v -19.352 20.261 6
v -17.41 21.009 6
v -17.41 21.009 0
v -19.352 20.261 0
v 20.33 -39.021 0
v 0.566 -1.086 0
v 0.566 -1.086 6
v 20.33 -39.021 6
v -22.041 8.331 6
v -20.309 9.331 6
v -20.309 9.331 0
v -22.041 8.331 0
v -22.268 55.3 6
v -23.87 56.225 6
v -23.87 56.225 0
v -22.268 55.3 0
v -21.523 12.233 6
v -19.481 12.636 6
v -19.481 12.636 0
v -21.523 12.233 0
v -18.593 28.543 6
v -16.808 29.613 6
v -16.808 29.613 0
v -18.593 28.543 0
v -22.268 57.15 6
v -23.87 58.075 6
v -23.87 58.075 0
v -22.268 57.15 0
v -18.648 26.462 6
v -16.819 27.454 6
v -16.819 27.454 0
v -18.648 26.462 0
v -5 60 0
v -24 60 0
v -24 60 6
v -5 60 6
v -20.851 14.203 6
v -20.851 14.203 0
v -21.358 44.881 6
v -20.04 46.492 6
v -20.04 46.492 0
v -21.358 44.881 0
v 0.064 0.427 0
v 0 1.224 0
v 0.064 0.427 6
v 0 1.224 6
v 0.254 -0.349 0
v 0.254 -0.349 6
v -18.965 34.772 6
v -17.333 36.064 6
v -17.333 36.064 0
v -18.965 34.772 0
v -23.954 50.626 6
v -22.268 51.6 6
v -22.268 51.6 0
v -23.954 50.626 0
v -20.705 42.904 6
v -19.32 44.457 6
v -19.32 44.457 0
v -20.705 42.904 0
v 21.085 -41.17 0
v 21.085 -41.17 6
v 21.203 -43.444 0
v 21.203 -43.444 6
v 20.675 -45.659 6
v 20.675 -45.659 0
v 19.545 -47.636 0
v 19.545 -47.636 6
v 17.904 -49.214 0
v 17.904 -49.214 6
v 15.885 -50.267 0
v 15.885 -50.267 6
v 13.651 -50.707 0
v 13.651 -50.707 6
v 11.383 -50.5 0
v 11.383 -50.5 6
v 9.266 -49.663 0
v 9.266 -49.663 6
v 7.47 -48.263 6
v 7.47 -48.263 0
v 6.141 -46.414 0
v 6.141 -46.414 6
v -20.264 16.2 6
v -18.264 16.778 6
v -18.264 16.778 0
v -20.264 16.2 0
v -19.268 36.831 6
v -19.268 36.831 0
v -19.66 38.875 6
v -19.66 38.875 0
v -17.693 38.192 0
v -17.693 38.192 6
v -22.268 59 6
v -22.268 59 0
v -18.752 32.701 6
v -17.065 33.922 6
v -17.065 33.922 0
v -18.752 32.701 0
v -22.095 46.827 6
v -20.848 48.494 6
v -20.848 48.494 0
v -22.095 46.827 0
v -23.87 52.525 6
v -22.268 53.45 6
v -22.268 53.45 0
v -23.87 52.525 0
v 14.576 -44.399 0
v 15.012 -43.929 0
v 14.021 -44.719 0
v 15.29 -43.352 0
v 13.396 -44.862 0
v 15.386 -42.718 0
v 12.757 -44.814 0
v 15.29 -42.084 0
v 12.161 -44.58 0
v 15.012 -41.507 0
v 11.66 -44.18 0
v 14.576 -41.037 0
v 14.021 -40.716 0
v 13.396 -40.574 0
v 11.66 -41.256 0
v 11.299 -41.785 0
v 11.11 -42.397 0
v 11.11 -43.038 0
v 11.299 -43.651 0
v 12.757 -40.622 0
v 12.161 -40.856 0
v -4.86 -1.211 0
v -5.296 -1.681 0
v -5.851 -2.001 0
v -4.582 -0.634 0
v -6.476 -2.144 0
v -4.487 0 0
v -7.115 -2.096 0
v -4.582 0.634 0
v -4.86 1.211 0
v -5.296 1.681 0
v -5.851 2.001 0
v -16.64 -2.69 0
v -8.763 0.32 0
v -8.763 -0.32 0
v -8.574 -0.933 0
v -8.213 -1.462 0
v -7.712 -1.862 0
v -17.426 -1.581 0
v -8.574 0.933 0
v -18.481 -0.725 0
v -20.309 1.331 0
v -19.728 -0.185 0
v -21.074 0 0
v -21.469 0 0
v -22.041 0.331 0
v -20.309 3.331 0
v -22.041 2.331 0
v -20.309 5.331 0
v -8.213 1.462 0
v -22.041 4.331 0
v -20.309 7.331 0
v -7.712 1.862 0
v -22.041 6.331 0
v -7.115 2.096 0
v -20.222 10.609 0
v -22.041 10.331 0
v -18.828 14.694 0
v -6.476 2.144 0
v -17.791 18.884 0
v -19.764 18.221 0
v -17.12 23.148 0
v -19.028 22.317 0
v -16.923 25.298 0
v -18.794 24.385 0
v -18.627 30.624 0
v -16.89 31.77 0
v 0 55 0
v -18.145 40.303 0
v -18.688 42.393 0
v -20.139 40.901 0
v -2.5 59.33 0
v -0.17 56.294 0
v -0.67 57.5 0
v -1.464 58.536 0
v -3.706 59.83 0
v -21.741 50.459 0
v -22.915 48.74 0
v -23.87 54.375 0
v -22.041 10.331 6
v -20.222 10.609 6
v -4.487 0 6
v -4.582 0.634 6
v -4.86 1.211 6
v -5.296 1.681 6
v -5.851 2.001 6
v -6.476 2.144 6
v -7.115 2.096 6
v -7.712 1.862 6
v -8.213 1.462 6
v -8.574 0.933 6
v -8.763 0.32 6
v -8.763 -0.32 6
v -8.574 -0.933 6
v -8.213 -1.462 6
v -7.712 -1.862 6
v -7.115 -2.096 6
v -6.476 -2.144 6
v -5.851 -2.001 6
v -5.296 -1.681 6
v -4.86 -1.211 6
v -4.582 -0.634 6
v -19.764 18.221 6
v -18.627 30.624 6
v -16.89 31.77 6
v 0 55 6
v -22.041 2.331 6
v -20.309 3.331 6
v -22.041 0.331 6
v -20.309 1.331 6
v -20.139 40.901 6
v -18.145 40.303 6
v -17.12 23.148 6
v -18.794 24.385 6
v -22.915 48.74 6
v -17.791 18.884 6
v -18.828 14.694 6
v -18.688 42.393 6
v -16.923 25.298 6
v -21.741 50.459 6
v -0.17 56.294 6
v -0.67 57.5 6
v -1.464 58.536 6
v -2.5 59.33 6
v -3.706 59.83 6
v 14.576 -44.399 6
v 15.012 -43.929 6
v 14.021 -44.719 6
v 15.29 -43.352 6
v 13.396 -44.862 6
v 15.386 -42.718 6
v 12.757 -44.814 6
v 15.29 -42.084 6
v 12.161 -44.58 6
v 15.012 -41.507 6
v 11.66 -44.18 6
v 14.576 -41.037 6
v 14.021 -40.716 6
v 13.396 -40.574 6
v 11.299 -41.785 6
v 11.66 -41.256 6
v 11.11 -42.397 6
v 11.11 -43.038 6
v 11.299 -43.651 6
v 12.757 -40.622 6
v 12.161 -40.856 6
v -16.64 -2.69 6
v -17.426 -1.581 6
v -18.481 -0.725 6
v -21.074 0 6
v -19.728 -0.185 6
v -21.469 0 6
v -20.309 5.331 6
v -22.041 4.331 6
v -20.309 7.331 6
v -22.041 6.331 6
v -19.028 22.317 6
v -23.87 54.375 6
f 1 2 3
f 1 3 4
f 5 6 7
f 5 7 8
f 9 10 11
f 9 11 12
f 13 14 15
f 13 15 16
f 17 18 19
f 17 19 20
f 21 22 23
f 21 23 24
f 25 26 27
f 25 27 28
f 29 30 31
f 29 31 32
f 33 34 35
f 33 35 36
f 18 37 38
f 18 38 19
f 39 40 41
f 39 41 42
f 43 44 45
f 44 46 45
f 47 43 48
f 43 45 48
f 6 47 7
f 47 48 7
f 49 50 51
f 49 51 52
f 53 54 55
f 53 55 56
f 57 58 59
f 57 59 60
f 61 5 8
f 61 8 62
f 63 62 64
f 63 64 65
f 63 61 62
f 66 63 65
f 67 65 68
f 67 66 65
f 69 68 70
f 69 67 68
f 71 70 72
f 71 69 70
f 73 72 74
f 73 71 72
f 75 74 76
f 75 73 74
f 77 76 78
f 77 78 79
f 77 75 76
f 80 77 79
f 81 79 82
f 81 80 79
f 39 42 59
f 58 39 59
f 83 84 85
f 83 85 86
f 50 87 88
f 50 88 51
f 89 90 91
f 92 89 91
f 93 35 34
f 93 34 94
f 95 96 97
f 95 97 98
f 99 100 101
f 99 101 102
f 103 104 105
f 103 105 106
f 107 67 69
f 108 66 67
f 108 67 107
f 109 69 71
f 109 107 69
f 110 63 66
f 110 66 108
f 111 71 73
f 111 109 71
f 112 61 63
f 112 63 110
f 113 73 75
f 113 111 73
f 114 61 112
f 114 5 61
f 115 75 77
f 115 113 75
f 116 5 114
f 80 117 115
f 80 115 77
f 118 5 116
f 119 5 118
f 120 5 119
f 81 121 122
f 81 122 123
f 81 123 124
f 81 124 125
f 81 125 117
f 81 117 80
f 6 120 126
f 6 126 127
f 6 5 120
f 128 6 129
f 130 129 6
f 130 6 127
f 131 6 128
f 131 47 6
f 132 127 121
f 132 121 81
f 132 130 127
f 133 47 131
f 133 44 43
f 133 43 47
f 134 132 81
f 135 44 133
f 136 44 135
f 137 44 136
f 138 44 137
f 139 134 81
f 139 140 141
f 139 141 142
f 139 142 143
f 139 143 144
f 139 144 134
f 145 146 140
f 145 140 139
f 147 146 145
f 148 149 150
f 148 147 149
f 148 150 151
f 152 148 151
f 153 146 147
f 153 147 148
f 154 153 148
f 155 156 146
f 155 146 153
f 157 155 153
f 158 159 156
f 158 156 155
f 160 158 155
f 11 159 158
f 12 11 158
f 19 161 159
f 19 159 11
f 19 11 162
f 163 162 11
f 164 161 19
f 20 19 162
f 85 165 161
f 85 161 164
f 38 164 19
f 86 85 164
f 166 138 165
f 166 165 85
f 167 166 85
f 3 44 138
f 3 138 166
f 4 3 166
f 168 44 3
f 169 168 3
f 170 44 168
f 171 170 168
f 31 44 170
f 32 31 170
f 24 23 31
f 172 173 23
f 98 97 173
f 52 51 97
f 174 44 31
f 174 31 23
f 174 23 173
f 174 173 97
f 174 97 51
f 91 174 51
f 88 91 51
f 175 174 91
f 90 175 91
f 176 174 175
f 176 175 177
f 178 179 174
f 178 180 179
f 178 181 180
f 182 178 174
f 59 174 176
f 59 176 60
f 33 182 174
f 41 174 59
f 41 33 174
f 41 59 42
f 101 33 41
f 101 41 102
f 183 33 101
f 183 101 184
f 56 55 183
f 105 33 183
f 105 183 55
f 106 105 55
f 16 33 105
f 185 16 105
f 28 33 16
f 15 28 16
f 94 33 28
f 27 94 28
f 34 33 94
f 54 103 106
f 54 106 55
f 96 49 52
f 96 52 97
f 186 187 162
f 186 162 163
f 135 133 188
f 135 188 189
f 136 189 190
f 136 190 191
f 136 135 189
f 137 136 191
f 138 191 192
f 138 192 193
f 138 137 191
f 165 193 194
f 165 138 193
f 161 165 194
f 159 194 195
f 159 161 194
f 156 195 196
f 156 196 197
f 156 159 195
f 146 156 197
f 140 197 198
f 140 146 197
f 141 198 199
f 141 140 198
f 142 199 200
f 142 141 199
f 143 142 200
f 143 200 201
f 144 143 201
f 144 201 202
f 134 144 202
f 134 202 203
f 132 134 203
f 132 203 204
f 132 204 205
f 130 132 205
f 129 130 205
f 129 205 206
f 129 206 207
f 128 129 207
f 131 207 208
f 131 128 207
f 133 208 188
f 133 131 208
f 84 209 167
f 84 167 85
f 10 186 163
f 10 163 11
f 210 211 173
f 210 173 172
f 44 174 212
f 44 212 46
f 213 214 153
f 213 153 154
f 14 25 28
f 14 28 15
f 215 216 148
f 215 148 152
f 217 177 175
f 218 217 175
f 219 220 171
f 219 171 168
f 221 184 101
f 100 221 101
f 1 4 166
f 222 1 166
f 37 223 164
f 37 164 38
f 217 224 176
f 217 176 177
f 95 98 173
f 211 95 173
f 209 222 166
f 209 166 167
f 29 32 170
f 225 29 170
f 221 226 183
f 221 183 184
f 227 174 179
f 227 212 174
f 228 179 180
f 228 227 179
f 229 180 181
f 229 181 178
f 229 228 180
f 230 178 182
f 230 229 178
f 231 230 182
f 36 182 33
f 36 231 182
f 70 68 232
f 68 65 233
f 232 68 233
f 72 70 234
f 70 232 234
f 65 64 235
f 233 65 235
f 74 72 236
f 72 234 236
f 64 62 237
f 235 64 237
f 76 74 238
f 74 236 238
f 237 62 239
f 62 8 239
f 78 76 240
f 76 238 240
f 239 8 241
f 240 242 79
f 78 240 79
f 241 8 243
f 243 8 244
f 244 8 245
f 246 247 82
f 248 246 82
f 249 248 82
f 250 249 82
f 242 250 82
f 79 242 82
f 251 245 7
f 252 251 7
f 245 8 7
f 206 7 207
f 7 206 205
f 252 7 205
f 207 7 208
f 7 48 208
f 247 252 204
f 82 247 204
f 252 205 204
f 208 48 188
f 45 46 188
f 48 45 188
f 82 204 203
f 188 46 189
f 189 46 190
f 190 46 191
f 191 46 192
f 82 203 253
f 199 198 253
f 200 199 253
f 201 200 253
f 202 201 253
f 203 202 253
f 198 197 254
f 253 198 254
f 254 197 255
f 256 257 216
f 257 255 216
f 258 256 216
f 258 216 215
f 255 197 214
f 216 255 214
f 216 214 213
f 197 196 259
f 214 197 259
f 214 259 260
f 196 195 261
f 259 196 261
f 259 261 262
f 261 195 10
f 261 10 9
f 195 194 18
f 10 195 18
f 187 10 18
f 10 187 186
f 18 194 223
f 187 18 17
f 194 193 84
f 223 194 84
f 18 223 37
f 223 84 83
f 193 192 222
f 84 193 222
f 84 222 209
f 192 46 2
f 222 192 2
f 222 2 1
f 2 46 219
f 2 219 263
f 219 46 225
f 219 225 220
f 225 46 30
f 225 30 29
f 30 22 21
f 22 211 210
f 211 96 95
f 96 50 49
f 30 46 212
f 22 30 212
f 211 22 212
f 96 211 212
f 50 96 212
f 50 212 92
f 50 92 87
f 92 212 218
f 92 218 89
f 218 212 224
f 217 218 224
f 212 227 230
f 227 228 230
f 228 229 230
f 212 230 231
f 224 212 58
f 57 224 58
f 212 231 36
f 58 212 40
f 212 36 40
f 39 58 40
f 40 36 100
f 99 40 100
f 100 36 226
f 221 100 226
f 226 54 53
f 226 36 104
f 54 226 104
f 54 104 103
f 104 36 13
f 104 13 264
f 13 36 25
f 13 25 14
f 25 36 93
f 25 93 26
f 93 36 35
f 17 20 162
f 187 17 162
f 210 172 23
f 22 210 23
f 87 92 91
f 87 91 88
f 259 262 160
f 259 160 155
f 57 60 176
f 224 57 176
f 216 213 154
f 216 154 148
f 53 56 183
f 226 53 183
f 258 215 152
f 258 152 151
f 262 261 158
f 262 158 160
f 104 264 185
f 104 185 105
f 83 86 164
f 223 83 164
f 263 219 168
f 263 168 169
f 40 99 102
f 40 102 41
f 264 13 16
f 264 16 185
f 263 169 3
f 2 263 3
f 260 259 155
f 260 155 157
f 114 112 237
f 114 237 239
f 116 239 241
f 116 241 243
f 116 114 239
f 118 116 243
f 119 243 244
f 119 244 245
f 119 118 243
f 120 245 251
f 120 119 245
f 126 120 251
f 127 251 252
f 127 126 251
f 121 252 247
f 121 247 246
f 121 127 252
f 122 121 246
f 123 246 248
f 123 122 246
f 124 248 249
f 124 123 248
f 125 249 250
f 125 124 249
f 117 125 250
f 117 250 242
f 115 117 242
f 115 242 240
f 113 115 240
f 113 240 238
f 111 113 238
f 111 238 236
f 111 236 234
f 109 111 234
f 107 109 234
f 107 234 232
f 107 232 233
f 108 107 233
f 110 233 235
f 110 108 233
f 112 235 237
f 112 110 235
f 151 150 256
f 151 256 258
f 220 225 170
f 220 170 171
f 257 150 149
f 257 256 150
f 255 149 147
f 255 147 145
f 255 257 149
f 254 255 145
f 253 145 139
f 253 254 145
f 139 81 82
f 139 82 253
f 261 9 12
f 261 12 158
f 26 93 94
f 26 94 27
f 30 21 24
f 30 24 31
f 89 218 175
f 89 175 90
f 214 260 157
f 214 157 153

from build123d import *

# Parameters (mm, degrees)
SKETCH1_R           = 2.15
BOSS_EXTRUDE1_DEPTH = 6
CUT_EXTRUDE1_DEPTH  = 65.899922958
LPATTERN1_COUNT     = 5
LPATTERN1_PITCH     = 1.85
FILLET1_R           = 5
CUT_EXTRUDE2_DEPTH  = 65.899922958
CIRPATTERN1_COUNT   = 20
CIRPATTERN1_ANGLE   = 47
CUT_EXTRUDE3_DEPTH  = 65.899922958
LPATTERN2_COUNT     = 8
LPATTERN2_PITCH     = 2


with BuildPart() as part:
    # Sketch1 → Boss-Extrude1 (new body)
    with BuildSketch(Plane.XY):
        with BuildLine():
            Line((0, 60), (0, 0))
            Line((0, 0), (20.330487993, -39.021420502))
            ThreePointArc((20.330487993, -39.021420502), (16.932136627, -49.812676592), (6.140880537, -46.414325226))
            Line((6.140880537, -46.414325226), (-18.041372942, 0))
            Line((-18.041372942, 0), (-22.041372942, 0))
            Line((-22.041372942, 0), (-22.041372942, 11.19846791))
            ThreePointArc((-22.041372942, 11.19846791), (-18.769082447, 31.167731967), (-24, 50.715542423))
            Line((-24, 50.715542423), (-24, 60))
            Line((-24, 60), (0, 60))
        make_face()
        with Locations((-6.63687696, 0)):
            Circle(SKETCH1_R, mode=Mode.SUBTRACT)
        with Locations((13.235684265, -42.717872864)):
            Circle(SKETCH1_R, mode=Mode.SUBTRACT)
    extrude(amount=BOSS_EXTRUDE1_DEPTH)

    # Sketch2 → Cut-Extrude1 (cut, through all)
    with BuildSketch(Plane.XY.offset(6)):
        Polygon((-24, 60), (-22.267949192, 59), (-24, 58), align=None)
    cut_extrude1 = extrude(amount=-CUT_EXTRUDE1_DEPTH, mode=Mode.SUBTRACT)

    # LPattern1: Cut-Extrude1 ×5
    with Locations(*[(0, -i * LPATTERN1_PITCH, 0) for i in range(1, LPATTERN1_COUNT)]):
        add(cut_extrude1, mode=Mode.SUBTRACT)

    # Fillet1
    fillet1_edges = [part.edges().sort_by_distance(p)[0] for p in [
        (0, 60, 3),
        (0, 0, 3),
        (-18.041372942, 0, 3),
    ]]
    fillet(fillet1_edges, radius=FILLET1_R)

    # Sketch3 → Cut-Extrude2 (cut, through all)
    with BuildSketch(Plane.XY.offset(6)):
        Polygon((-23.954411467, 50.626320552), (-21.741449412, 50.459283267), (-22.992588972, 48.626320552), align=None)
    cut_extrude2 = extrude(amount=-CUT_EXTRUDE2_DEPTH, mode=Mode.SUBTRACT)

    # CirPattern1: Cut-Extrude2 ×20 about axis
    cirpattern1_axis = Axis((-66.806944036, 28.78678002, 0), (0, 0, -1))
    for i in range(1, CIRPATTERN1_COUNT):
        add(cut_extrude2.rotate(cirpattern1_axis, i * CIRPATTERN1_ANGLE / (CIRPATTERN1_COUNT - 1)), mode=Mode.SUBTRACT)

    # Sketch4 → Cut-Extrude3 (cut, through all)
    with BuildSketch(Plane.XY.offset(6)):
        Polygon((-22.041372942, 10.33072384), (-20.309322134, 9.33072384), (-22.041372942, 8.33072384), align=None)
    cut_extrude3 = extrude(amount=-CUT_EXTRUDE3_DEPTH, mode=Mode.SUBTRACT)

    # LPattern2: Cut-Extrude3 ×8
    with Locations(*[(0, -i * LPATTERN2_PITCH, 0) for i in range(1, LPATTERN2_COUNT)]):
        add(cut_extrude3, mode=Mode.SUBTRACT)


solid = part.part
